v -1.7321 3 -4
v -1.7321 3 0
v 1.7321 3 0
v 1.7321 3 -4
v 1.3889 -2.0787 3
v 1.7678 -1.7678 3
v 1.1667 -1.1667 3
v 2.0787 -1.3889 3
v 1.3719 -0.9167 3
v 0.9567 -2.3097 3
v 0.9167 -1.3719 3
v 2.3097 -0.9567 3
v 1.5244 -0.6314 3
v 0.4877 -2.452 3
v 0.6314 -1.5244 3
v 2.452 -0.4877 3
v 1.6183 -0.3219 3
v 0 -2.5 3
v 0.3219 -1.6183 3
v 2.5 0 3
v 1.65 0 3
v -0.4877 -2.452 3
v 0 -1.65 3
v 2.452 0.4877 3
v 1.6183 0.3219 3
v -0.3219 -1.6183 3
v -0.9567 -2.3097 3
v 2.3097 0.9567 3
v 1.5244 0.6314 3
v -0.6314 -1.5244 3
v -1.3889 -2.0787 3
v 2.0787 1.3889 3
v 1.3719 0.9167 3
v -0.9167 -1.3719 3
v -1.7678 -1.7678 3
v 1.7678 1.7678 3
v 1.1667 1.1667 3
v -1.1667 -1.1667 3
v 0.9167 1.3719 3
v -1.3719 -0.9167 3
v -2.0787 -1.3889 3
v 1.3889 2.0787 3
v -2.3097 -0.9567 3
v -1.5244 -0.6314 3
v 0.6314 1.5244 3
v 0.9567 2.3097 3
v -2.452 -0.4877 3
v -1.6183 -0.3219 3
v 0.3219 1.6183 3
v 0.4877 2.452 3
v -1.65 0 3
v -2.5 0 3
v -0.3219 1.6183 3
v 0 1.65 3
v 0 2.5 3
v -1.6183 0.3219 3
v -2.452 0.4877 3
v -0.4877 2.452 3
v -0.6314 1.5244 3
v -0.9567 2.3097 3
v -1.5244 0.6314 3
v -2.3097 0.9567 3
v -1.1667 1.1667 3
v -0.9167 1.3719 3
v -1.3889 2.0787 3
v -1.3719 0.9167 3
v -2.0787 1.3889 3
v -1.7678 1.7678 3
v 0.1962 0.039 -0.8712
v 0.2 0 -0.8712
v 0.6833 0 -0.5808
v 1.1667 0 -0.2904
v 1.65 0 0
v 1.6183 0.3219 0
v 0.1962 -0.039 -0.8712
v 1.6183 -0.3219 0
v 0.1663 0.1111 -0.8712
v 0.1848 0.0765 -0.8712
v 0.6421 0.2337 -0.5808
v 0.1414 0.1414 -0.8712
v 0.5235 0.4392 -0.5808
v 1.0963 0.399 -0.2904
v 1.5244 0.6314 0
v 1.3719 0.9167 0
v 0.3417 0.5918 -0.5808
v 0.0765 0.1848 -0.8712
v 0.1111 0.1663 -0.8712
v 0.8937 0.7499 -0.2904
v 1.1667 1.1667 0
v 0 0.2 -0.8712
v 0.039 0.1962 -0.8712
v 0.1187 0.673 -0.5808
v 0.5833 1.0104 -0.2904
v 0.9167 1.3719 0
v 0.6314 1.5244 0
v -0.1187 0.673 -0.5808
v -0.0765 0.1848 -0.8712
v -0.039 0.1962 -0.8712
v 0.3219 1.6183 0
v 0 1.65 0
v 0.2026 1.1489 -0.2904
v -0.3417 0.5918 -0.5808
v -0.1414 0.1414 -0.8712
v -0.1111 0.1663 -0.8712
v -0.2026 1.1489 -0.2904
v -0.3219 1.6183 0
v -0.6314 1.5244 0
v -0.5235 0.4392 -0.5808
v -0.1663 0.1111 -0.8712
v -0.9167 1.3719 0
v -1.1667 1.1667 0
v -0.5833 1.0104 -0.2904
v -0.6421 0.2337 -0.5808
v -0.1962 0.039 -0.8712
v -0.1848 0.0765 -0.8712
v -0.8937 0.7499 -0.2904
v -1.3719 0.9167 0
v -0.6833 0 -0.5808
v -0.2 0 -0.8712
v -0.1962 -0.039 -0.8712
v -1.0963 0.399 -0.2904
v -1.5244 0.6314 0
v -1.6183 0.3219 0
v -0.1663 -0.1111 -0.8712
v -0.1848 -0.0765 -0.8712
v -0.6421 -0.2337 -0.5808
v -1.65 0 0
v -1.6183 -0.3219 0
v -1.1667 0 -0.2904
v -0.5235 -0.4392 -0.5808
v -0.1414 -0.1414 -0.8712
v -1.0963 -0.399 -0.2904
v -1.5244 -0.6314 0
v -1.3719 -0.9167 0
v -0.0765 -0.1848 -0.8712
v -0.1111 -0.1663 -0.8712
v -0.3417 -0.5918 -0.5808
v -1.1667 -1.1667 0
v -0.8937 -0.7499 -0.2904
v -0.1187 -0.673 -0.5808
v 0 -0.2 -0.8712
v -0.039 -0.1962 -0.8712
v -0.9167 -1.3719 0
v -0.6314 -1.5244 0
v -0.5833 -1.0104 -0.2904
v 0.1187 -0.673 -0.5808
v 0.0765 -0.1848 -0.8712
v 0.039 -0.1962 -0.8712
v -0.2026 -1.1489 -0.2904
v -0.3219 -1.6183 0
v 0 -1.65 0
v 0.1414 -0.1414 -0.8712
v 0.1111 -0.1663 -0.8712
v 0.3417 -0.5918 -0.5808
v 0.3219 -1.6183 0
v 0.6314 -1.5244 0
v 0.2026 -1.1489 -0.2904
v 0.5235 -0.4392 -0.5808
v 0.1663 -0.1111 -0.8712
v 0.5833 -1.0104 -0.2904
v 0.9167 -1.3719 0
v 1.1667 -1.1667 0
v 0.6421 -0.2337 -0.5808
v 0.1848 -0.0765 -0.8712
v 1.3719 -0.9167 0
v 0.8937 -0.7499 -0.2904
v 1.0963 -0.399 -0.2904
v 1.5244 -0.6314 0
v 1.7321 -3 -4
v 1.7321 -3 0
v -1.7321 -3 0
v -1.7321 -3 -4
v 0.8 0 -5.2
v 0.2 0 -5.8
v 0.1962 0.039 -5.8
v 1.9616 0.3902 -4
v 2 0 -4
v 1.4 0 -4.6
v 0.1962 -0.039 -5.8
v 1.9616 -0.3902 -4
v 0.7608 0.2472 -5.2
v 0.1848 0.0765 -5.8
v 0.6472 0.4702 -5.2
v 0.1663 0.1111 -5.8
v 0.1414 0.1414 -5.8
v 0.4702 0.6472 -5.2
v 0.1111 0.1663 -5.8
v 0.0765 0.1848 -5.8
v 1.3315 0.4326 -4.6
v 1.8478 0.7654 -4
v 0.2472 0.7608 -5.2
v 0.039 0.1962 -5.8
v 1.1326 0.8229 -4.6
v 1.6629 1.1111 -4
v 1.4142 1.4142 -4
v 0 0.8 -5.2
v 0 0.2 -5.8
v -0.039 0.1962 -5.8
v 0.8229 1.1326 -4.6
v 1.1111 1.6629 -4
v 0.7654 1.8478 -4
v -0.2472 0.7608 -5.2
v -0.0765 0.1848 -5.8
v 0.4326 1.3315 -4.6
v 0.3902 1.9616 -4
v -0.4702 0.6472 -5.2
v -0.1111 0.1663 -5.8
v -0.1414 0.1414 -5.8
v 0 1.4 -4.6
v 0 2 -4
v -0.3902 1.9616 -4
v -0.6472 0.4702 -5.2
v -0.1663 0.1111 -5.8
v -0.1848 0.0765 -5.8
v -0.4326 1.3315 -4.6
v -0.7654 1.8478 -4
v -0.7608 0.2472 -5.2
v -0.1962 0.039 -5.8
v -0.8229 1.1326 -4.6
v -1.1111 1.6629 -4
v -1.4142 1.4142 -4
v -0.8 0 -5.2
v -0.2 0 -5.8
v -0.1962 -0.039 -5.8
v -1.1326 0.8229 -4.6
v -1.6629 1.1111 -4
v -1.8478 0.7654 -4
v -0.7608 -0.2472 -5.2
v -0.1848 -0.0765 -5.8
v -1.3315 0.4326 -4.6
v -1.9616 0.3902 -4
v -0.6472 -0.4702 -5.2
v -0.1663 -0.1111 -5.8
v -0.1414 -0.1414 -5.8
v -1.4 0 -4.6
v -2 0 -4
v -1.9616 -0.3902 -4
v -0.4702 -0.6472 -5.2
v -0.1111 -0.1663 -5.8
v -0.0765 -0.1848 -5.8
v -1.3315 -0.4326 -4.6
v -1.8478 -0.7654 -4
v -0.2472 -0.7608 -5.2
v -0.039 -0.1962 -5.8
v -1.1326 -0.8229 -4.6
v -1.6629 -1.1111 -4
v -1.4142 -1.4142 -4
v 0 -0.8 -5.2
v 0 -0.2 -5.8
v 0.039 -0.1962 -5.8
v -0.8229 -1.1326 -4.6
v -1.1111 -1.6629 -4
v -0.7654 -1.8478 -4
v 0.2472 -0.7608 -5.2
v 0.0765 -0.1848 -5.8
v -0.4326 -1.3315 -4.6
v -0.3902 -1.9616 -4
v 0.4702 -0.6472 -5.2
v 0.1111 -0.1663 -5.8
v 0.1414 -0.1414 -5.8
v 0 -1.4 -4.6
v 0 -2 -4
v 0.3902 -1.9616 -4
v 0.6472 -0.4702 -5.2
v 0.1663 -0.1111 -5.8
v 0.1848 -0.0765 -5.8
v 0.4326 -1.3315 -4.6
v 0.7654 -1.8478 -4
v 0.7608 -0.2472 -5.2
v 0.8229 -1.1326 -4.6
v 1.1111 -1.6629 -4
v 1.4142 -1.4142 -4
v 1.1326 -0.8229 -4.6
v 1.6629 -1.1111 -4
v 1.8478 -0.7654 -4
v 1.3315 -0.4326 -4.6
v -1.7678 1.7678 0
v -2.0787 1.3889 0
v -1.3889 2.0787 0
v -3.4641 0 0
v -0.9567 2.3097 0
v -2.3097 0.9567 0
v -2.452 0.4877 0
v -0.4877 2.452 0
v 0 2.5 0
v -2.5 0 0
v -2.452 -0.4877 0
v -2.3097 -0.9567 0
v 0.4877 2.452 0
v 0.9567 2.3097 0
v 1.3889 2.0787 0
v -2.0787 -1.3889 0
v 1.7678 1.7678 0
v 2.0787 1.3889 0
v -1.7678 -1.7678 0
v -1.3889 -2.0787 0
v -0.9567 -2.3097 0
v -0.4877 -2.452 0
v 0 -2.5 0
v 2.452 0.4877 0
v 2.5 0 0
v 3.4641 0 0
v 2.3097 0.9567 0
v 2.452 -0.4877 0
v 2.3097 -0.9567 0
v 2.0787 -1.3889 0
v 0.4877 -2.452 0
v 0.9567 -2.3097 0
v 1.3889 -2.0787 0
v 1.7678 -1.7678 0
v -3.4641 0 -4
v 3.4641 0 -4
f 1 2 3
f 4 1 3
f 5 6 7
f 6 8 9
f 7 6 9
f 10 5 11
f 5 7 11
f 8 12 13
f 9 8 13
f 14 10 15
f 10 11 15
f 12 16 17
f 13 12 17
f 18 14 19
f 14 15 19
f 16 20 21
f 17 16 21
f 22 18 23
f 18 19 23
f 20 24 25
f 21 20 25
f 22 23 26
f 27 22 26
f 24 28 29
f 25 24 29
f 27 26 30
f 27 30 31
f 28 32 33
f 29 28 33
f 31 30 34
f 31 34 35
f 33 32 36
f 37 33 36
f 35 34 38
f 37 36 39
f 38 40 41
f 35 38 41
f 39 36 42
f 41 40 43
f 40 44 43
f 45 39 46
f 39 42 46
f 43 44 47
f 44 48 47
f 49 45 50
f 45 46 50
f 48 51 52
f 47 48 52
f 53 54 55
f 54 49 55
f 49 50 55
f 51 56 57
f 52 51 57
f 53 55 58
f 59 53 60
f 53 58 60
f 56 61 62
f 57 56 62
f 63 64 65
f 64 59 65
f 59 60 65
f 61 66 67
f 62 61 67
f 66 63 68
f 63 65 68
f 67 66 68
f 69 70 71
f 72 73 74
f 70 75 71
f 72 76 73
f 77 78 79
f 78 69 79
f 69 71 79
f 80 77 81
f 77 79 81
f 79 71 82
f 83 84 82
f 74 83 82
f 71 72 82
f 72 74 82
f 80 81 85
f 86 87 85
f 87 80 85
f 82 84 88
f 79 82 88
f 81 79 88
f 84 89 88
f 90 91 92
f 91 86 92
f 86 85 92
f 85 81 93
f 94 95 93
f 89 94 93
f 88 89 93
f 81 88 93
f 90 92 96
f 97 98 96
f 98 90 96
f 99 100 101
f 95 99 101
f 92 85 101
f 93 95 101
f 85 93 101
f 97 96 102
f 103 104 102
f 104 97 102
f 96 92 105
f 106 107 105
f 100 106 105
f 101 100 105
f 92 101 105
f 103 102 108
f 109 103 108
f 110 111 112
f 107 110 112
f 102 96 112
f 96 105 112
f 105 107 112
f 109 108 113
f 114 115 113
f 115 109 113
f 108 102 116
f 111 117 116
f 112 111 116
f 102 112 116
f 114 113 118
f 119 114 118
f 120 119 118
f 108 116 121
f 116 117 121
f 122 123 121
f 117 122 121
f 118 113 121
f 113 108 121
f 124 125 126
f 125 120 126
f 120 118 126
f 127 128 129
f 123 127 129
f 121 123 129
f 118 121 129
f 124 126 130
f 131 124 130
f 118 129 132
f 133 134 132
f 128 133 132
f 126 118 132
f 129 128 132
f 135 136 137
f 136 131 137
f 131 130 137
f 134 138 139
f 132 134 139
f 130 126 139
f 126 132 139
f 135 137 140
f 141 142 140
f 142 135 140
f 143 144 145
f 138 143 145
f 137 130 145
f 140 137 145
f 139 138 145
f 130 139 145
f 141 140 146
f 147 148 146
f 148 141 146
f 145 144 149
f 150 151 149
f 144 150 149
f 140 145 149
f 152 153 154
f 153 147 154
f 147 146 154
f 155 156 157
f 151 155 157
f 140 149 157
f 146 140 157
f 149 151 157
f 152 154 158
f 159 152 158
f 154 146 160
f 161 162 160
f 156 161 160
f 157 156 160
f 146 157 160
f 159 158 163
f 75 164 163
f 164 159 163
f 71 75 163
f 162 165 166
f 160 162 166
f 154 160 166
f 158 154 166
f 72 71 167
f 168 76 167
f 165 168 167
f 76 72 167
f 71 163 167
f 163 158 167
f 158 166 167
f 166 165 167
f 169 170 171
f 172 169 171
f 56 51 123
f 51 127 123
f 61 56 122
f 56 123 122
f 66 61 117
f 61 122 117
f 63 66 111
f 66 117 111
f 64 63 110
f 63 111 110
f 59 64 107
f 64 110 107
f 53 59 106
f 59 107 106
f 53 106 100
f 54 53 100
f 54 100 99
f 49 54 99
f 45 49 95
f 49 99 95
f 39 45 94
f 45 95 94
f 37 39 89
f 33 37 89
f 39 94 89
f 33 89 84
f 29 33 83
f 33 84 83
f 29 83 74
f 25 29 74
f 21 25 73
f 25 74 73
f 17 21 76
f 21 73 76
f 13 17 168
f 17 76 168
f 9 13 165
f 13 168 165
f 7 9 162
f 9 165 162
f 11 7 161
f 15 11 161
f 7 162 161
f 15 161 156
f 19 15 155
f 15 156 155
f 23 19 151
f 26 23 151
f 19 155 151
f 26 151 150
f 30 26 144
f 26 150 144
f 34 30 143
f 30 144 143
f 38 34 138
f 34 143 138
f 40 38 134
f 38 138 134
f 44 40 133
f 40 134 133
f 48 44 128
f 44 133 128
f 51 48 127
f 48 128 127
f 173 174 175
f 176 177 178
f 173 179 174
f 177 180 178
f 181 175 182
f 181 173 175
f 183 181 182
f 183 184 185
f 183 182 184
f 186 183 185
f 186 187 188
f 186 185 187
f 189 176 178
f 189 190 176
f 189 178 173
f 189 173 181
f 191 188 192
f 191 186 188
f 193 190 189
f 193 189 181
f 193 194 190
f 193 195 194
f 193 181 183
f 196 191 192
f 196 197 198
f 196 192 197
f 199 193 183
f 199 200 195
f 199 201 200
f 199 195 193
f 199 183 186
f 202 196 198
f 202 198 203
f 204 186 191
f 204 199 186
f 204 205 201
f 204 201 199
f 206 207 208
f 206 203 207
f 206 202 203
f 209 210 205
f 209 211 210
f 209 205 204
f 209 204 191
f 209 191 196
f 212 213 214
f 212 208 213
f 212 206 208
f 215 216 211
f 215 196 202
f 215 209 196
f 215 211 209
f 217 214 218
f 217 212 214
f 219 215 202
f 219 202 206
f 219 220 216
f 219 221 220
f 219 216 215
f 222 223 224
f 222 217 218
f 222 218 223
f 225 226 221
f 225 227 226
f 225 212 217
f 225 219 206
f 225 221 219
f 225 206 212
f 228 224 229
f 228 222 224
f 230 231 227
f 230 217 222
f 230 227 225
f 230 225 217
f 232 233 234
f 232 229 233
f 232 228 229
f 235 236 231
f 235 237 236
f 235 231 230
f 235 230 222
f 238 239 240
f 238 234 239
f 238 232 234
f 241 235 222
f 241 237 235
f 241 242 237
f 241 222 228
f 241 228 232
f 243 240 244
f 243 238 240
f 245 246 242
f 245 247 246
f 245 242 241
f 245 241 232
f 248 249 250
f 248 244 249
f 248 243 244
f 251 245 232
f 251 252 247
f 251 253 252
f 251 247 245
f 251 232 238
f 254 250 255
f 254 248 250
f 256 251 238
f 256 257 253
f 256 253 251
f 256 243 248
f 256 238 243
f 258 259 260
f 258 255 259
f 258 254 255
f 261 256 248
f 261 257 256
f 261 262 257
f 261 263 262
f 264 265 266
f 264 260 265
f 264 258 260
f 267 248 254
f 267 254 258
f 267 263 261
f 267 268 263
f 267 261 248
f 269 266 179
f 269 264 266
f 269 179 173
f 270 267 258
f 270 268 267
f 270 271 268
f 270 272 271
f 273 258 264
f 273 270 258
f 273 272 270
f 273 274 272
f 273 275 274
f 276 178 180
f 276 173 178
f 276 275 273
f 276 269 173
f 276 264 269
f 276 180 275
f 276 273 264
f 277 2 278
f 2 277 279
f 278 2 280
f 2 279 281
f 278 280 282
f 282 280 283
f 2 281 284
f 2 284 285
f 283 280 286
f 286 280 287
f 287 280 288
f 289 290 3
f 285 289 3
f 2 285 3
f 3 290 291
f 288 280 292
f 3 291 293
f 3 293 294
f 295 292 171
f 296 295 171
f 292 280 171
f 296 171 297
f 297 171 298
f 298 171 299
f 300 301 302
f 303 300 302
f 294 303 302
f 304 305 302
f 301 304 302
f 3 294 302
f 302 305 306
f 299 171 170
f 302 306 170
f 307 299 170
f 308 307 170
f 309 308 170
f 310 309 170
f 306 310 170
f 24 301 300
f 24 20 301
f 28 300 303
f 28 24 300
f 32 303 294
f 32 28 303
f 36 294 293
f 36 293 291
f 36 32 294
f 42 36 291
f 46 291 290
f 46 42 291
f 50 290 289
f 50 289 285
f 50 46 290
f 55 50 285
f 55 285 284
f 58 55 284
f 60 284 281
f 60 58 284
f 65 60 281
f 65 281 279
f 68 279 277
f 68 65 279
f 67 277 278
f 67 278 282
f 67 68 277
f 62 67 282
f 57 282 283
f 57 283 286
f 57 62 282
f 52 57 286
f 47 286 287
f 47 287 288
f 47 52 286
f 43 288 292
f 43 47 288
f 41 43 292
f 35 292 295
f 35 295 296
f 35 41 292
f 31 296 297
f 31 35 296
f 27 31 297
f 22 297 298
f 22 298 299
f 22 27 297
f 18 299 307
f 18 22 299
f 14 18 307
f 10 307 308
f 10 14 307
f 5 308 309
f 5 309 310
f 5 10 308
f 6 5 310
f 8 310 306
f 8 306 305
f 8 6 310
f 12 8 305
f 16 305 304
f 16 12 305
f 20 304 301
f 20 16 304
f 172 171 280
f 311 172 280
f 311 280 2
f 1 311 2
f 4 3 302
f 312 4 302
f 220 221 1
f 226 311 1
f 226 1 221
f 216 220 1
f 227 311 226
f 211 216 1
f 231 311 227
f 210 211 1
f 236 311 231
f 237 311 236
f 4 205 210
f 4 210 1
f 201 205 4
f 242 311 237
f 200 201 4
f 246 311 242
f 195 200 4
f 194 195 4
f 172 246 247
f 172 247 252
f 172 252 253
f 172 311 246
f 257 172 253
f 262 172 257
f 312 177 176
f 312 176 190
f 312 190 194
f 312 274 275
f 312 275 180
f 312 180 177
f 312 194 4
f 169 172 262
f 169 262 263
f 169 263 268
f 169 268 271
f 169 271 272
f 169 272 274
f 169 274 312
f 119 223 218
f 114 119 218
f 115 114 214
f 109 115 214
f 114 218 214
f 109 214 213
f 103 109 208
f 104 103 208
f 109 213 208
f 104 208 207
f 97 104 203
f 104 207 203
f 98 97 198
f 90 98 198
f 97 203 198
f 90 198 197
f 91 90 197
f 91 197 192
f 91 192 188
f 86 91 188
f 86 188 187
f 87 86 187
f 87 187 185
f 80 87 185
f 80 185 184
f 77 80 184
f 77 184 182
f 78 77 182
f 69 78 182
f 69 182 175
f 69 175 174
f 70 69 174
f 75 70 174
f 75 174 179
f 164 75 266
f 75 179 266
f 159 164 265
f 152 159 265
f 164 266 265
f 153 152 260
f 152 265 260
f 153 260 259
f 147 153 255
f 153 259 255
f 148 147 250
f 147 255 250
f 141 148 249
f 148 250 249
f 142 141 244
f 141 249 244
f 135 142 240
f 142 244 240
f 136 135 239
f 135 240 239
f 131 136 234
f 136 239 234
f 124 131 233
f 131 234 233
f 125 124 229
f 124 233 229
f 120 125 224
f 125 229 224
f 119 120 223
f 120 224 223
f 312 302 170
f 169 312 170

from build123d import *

# Parameters (mm, degrees)
F0_W     = 2.5
F0_H     = 3
F2_R     = 2.5
F3_DEPTH = 4
F7_D     = 3.3
F7_DEPTH = 3
F7_TIP   = 0.9914200214
F9_D     = 0.4


with BuildPart() as f1:
    # F0 (on Front) → F1 (revolve)
    with BuildSketch(Plane.XZ):
        with Locations((1.25, 1.5)):
            Rectangle(F0_W, F0_H)
    revolve(axis=Axis((0, 0, 1.5), (0, 0, 1)))

    # F2 (on face) → F3 (join)
    with BuildSketch(Plane(origin=(0, 0, 0), x_dir=(1, 0, 0), z_dir=(0, 0, -1))):
        Polygon((1.7320508076, 3), (-1.7320508076, 3), (-3.4641016151, 0), (-1.7320508076, -3), (1.7320508076, -3), (3.4641016151, 0), align=None)
        Circle(F2_R, mode=Mode.SUBTRACT)
        Circle(F2_R)
    extrude(amount=F3_DEPTH)

    # F4 (on Front) → F5 (revolve)
    with BuildSketch(Plane.XZ):
        Polygon((2, -4), (0, -4), (0, -6), align=None)
    revolve(axis=Axis((0, 0, -5), (0, 0, 1)))

    # F7
    with Locations(Plane.XY.offset(3)):
        with Locations((0, 0)):
            Hole(F7_D / 2, depth=F7_DEPTH)
            with Locations((0, 0, -(F7_DEPTH + F7_TIP / 2))):  # 118° drill point
                Cone(0, F7_D / 2, F7_TIP, mode=Mode.SUBTRACT)

    # F9 (through all)
    with Locations(Plane.XY.offset(3)):
        with Locations((0, 0)):
            Hole(F9_D / 2)


solid = f1.part
